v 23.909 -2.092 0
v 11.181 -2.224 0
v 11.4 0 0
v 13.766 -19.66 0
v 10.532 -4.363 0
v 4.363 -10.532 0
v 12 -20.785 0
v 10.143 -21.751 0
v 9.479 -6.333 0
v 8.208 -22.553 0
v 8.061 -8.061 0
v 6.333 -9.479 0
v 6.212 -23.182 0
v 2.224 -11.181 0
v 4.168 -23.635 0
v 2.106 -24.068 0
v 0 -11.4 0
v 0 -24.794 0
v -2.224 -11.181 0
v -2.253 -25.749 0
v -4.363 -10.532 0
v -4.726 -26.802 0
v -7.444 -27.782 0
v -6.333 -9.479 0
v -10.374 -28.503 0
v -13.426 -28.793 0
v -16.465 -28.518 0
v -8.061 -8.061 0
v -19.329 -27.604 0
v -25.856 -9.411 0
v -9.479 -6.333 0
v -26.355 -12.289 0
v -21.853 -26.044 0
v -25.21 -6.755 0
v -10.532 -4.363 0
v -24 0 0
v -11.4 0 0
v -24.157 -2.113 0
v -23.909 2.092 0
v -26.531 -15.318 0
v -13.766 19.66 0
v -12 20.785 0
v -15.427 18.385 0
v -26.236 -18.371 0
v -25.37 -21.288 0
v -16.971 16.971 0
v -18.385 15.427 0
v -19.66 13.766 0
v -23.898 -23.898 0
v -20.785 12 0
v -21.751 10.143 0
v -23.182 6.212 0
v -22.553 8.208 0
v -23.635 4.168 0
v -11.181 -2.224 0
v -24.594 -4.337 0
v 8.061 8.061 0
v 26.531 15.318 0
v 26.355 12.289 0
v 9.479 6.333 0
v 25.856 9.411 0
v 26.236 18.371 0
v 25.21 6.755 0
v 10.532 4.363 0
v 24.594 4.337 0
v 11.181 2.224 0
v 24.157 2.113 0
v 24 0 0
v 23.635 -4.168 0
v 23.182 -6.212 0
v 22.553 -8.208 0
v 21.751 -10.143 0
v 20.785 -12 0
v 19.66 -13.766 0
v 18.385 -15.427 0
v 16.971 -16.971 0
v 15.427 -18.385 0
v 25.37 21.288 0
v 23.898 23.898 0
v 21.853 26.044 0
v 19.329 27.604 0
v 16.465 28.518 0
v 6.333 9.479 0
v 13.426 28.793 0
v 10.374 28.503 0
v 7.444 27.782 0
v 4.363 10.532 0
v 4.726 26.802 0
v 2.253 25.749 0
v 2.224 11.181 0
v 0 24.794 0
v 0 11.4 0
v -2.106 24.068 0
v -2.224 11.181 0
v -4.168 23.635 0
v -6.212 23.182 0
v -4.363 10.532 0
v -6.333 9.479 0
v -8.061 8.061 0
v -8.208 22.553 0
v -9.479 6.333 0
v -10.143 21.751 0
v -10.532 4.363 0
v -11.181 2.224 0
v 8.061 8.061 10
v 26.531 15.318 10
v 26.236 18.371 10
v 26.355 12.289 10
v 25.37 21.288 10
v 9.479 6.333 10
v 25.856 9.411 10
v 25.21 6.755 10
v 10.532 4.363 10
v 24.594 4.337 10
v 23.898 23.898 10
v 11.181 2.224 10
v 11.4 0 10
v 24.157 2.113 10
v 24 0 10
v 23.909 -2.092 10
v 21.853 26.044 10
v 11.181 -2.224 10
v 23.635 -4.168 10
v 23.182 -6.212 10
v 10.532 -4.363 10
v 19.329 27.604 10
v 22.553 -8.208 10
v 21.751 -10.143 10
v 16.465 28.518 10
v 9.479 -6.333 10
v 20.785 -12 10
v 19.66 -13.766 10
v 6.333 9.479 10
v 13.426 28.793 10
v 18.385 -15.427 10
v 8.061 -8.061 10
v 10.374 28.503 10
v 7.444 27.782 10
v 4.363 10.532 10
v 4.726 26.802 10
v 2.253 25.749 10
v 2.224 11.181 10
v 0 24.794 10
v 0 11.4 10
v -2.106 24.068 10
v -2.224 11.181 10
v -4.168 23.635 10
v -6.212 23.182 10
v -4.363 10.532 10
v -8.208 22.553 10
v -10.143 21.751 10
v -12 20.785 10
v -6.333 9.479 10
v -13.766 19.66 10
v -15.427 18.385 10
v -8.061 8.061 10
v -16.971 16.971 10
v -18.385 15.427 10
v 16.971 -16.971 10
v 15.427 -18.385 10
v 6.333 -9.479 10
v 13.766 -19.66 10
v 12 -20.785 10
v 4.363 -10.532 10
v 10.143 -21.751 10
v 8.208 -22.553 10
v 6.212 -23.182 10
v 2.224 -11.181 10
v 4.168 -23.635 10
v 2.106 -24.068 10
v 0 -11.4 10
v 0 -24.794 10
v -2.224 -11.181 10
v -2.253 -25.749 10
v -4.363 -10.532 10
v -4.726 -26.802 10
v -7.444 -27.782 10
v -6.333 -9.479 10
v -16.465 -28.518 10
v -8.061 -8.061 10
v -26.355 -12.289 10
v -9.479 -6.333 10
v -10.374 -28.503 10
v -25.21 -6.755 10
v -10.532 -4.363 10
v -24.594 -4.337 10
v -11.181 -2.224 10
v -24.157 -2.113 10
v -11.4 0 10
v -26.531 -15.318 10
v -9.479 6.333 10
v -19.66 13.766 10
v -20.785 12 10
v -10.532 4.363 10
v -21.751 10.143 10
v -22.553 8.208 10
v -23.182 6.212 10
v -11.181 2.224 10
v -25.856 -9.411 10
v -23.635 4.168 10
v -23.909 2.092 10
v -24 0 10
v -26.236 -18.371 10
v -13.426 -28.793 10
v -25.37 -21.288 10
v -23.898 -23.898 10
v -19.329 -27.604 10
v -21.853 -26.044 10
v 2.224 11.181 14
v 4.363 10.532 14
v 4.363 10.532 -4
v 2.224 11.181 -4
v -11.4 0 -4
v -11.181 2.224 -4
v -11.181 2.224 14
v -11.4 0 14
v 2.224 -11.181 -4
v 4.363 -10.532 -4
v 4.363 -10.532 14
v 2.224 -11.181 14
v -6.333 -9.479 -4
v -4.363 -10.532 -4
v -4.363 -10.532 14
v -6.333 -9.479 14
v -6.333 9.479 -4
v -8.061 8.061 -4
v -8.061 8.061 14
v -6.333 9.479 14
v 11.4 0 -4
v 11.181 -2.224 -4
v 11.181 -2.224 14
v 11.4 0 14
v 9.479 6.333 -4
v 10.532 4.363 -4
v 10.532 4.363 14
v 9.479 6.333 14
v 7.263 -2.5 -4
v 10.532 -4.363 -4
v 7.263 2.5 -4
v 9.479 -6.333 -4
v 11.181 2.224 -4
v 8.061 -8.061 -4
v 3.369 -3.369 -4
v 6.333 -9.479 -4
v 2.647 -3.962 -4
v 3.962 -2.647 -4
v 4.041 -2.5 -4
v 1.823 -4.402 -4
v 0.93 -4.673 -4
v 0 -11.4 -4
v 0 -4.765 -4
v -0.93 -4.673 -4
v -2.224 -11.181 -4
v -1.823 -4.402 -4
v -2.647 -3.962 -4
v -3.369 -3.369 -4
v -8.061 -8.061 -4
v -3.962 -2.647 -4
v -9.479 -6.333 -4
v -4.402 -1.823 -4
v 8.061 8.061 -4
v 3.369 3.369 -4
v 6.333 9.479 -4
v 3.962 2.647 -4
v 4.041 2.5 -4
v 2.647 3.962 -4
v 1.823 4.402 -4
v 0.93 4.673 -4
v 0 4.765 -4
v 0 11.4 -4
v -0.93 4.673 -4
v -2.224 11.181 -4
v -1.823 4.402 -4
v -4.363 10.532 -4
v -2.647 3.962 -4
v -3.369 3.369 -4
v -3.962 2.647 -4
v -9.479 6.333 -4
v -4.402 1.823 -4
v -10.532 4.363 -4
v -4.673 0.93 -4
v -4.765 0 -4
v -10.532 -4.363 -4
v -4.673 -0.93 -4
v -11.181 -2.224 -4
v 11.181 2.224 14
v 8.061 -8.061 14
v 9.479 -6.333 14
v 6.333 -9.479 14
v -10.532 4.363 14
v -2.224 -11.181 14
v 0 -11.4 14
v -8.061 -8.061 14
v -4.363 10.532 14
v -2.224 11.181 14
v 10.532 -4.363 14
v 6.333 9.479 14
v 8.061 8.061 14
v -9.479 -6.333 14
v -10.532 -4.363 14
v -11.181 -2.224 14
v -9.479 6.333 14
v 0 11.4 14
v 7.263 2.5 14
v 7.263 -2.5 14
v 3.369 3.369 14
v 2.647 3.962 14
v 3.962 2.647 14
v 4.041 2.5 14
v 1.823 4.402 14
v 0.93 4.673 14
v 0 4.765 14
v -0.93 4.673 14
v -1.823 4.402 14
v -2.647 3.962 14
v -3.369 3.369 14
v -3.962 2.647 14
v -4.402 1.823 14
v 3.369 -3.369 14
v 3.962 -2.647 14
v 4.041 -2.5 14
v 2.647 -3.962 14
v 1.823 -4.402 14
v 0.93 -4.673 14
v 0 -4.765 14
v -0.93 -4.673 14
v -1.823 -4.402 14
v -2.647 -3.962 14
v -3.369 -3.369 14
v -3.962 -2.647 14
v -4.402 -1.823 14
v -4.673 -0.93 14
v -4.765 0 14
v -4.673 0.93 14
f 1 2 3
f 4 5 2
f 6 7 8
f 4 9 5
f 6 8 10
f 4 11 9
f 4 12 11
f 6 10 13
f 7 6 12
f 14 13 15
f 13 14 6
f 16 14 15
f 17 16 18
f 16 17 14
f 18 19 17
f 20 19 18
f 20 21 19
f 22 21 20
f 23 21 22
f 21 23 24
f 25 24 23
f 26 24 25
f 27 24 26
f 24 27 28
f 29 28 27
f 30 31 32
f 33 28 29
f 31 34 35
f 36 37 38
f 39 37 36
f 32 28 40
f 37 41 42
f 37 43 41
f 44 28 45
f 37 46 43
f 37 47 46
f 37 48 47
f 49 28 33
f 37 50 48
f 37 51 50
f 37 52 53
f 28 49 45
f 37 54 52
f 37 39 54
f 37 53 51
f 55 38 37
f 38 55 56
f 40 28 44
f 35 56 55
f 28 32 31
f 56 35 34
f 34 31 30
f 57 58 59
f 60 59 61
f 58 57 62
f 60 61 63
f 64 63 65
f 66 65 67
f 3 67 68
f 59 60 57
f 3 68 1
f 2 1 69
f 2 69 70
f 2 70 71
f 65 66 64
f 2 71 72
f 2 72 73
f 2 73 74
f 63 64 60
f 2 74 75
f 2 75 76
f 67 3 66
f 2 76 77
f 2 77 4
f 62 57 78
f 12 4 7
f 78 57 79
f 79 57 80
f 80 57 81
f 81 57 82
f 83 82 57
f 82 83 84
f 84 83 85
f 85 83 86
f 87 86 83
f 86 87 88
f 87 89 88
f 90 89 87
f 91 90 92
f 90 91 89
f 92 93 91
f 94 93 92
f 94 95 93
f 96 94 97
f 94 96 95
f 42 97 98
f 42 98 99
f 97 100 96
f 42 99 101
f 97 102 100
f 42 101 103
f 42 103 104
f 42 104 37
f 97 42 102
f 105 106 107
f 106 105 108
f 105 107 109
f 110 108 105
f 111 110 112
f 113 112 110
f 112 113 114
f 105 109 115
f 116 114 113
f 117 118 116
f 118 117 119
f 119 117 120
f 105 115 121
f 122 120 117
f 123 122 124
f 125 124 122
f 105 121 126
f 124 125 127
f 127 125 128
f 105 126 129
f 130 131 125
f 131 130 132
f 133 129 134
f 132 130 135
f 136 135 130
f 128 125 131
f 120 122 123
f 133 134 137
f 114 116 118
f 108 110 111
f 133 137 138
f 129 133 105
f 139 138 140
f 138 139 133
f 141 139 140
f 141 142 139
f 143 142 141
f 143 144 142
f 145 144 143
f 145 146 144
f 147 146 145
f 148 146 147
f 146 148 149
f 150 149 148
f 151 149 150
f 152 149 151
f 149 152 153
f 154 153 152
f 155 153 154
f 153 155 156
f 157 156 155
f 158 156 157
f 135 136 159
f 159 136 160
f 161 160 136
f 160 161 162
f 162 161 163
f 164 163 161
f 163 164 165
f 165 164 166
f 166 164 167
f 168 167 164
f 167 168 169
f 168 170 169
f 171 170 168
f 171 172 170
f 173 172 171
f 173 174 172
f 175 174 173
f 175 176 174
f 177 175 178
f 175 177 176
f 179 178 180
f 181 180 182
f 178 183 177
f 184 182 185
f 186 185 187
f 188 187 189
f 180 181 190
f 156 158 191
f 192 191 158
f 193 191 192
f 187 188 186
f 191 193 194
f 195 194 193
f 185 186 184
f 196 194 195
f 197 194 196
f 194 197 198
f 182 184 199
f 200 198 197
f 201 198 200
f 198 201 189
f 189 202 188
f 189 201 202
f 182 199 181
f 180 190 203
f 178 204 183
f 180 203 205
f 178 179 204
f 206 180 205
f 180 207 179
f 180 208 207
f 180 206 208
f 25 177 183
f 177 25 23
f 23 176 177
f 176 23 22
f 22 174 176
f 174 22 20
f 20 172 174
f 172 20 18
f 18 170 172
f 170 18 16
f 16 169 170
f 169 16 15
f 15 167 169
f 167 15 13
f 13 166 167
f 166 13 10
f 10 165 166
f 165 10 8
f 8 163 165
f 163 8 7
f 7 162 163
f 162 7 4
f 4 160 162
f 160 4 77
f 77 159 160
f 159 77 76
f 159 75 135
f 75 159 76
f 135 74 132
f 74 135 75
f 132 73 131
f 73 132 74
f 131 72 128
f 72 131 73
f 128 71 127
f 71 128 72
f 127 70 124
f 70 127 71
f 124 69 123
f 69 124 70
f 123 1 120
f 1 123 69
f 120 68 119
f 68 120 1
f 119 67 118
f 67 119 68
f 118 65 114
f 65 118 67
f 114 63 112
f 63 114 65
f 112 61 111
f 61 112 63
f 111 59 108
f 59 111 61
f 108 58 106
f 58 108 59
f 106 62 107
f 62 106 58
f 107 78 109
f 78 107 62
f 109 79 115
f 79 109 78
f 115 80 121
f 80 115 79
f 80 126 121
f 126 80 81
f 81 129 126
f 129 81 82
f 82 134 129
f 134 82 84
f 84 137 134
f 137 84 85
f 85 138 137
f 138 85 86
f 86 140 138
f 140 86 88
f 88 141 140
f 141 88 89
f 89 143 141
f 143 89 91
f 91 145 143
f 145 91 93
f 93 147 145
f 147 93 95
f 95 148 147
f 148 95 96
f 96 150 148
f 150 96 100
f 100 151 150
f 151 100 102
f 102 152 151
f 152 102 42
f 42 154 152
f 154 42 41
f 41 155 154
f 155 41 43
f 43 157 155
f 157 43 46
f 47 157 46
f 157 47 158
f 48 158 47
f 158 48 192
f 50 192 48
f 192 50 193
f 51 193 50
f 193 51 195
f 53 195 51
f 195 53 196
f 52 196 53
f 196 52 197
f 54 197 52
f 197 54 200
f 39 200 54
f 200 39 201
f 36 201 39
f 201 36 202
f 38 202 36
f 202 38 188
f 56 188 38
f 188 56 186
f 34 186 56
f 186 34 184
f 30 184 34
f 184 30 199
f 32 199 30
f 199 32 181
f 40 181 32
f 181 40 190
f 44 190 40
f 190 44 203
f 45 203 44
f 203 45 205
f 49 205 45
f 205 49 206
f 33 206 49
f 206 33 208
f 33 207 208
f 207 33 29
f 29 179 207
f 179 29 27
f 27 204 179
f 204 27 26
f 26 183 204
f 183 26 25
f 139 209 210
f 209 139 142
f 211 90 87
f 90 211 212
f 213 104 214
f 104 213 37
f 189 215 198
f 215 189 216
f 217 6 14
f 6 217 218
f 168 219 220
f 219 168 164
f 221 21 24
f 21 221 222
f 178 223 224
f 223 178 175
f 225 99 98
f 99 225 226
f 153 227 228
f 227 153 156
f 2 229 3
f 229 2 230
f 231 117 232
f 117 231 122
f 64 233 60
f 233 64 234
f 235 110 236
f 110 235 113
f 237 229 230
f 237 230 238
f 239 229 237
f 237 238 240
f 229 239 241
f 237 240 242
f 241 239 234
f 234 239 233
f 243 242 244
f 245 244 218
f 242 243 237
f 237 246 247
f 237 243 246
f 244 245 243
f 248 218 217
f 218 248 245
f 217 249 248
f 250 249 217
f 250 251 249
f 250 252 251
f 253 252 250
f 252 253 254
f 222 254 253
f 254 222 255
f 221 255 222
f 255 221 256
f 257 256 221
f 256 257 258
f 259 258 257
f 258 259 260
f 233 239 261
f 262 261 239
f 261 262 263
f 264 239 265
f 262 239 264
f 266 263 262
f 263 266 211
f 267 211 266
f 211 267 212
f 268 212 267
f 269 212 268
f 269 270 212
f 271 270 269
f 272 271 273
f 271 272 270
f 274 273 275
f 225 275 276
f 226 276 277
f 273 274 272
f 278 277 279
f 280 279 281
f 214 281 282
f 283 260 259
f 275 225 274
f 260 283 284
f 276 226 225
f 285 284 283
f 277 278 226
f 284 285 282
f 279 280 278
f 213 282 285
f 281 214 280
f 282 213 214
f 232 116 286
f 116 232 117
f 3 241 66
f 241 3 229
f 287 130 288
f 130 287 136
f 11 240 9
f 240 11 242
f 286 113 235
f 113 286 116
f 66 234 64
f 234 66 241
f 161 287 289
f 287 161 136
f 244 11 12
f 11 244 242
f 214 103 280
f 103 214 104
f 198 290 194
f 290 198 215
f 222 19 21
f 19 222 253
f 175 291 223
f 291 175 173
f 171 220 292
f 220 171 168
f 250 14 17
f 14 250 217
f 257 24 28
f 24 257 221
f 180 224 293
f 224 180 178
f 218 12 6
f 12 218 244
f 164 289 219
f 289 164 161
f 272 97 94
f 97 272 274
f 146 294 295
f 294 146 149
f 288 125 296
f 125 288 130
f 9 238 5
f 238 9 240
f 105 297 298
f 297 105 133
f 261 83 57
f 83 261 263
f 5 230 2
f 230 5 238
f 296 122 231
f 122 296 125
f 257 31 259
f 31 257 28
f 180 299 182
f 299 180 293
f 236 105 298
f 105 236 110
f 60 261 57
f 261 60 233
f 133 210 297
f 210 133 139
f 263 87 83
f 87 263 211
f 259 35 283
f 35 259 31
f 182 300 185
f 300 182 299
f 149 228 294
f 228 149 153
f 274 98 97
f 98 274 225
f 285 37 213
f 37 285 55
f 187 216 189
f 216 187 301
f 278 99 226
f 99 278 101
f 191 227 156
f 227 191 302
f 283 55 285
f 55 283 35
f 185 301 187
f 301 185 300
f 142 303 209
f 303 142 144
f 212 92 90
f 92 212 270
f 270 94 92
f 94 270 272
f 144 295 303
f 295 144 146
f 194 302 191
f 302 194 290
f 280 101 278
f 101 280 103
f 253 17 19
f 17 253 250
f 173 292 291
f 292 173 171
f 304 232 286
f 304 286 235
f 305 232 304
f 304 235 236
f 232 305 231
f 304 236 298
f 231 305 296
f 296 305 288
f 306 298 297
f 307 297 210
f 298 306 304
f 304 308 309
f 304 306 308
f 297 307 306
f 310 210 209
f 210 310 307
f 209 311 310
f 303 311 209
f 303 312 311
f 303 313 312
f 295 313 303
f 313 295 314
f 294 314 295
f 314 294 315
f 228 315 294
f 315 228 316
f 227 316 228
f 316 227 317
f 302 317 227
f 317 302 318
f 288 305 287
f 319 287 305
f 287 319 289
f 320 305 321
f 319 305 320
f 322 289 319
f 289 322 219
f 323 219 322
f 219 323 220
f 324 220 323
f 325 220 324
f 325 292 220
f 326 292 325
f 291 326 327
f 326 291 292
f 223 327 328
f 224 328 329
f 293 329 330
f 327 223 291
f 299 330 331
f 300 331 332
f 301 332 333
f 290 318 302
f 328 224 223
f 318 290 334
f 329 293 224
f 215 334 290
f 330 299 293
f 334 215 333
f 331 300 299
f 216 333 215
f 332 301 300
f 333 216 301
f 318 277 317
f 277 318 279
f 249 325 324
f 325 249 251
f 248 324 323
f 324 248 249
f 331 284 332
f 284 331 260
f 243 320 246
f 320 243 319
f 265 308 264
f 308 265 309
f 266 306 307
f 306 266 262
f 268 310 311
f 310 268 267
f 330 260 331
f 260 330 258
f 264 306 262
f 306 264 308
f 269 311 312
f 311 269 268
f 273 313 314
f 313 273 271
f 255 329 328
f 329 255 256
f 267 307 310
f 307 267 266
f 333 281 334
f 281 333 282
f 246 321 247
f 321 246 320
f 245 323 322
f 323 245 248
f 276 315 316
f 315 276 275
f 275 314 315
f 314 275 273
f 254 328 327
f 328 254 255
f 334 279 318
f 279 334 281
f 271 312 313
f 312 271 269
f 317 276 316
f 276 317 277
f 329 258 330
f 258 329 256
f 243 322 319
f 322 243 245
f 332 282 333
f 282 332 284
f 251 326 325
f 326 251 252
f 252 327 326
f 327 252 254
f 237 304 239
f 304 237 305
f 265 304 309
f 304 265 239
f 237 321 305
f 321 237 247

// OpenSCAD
$fn = 32;

// ----------------------------------------------------------------------
// Cam: base radius 24 mm with a 10 mm lift over 180 degrees
// ----------------------------------------------------------------------

// --- parameters (mm) ---
base_r = 24;              // base radius
lift = 10;                // lift height above the base radius
lift_span = 180;          // angular width of the lift
lift_start = 0;           // angle where the lift starts
cam_t = 10;               // cam plate thickness
hub_d = 22.8;             // hub diameter
hub_h = 18;               // hub height
bore_d = 9.53;            // bore
key_w = 5;                // keyway width
key_depth = 2.5;          // keyway depth

cam_profile = [[24, 0], [24.157, 2.113], [24.594, 4.337], [25.21, 6.755], [25.856, 9.411], [26.355, 12.289], [26.531, 15.318], [26.236, 18.371], [25.37, 21.288], [23.898, 23.898], [21.853, 26.044], [19.329, 27.604], [16.465, 28.518], [13.426, 28.793], [10.374, 28.503], [7.444, 27.782], [4.726, 26.802], [2.253, 25.749], [0, 24.794], [-2.106, 24.068], [-4.168, 23.635], [-6.212, 23.182], [-8.208, 22.553], [-10.143, 21.751], [-12, 20.785], [-13.766, 19.66], [-15.427, 18.385], [-16.971, 16.971], [-18.385, 15.427], [-19.66, 13.766], [-20.785, 12], [-21.751, 10.143], [-22.553, 8.208], [-23.182, 6.212], [-23.635, 4.168], [-23.909, 2.092], [-24, 0], [-24.157, -2.113], [-24.594, -4.337], [-25.21, -6.755], [-25.856, -9.411], [-26.355, -12.289], [-26.531, -15.318], [-26.236, -18.371], [-25.37, -21.288], [-23.898, -23.898], [-21.853, -26.044], [-19.329, -27.604], [-16.465, -28.518], [-13.426, -28.793], [-10.374, -28.503], [-7.444, -27.782], [-4.726, -26.802], [-2.253, -25.749], [0, -24.794], [2.106, -24.068], [4.168, -23.635], [6.212, -23.182], [8.208, -22.553], [10.143, -21.751], [12, -20.785], [13.766, -19.66], [15.427, -18.385], [16.971, -16.971], [18.385, -15.427], [19.66, -13.766], [20.785, -12], [21.751, -10.143], [22.553, -8.208], [23.182, -6.212], [23.635, -4.168], [23.909, -2.092]];

difference() {
  union() {
    linear_extrude(height = cam_t) polygon(cam_profile);
    /* hub, proud of the cam plate on both sides */
    translate([0, 0, -4]) cylinder(h = hub_h, d = hub_d);
  }
  /* bore through the hub, 2.5 mm clear on both faces */
  translate([0, 0, -6.5]) cylinder(h = hub_h + 5, d = bore_d);
  /* keyway, milled through the whole hub */
  translate([2.263, -2.5, -6.5]) cube([5, 5, 23]);
}
